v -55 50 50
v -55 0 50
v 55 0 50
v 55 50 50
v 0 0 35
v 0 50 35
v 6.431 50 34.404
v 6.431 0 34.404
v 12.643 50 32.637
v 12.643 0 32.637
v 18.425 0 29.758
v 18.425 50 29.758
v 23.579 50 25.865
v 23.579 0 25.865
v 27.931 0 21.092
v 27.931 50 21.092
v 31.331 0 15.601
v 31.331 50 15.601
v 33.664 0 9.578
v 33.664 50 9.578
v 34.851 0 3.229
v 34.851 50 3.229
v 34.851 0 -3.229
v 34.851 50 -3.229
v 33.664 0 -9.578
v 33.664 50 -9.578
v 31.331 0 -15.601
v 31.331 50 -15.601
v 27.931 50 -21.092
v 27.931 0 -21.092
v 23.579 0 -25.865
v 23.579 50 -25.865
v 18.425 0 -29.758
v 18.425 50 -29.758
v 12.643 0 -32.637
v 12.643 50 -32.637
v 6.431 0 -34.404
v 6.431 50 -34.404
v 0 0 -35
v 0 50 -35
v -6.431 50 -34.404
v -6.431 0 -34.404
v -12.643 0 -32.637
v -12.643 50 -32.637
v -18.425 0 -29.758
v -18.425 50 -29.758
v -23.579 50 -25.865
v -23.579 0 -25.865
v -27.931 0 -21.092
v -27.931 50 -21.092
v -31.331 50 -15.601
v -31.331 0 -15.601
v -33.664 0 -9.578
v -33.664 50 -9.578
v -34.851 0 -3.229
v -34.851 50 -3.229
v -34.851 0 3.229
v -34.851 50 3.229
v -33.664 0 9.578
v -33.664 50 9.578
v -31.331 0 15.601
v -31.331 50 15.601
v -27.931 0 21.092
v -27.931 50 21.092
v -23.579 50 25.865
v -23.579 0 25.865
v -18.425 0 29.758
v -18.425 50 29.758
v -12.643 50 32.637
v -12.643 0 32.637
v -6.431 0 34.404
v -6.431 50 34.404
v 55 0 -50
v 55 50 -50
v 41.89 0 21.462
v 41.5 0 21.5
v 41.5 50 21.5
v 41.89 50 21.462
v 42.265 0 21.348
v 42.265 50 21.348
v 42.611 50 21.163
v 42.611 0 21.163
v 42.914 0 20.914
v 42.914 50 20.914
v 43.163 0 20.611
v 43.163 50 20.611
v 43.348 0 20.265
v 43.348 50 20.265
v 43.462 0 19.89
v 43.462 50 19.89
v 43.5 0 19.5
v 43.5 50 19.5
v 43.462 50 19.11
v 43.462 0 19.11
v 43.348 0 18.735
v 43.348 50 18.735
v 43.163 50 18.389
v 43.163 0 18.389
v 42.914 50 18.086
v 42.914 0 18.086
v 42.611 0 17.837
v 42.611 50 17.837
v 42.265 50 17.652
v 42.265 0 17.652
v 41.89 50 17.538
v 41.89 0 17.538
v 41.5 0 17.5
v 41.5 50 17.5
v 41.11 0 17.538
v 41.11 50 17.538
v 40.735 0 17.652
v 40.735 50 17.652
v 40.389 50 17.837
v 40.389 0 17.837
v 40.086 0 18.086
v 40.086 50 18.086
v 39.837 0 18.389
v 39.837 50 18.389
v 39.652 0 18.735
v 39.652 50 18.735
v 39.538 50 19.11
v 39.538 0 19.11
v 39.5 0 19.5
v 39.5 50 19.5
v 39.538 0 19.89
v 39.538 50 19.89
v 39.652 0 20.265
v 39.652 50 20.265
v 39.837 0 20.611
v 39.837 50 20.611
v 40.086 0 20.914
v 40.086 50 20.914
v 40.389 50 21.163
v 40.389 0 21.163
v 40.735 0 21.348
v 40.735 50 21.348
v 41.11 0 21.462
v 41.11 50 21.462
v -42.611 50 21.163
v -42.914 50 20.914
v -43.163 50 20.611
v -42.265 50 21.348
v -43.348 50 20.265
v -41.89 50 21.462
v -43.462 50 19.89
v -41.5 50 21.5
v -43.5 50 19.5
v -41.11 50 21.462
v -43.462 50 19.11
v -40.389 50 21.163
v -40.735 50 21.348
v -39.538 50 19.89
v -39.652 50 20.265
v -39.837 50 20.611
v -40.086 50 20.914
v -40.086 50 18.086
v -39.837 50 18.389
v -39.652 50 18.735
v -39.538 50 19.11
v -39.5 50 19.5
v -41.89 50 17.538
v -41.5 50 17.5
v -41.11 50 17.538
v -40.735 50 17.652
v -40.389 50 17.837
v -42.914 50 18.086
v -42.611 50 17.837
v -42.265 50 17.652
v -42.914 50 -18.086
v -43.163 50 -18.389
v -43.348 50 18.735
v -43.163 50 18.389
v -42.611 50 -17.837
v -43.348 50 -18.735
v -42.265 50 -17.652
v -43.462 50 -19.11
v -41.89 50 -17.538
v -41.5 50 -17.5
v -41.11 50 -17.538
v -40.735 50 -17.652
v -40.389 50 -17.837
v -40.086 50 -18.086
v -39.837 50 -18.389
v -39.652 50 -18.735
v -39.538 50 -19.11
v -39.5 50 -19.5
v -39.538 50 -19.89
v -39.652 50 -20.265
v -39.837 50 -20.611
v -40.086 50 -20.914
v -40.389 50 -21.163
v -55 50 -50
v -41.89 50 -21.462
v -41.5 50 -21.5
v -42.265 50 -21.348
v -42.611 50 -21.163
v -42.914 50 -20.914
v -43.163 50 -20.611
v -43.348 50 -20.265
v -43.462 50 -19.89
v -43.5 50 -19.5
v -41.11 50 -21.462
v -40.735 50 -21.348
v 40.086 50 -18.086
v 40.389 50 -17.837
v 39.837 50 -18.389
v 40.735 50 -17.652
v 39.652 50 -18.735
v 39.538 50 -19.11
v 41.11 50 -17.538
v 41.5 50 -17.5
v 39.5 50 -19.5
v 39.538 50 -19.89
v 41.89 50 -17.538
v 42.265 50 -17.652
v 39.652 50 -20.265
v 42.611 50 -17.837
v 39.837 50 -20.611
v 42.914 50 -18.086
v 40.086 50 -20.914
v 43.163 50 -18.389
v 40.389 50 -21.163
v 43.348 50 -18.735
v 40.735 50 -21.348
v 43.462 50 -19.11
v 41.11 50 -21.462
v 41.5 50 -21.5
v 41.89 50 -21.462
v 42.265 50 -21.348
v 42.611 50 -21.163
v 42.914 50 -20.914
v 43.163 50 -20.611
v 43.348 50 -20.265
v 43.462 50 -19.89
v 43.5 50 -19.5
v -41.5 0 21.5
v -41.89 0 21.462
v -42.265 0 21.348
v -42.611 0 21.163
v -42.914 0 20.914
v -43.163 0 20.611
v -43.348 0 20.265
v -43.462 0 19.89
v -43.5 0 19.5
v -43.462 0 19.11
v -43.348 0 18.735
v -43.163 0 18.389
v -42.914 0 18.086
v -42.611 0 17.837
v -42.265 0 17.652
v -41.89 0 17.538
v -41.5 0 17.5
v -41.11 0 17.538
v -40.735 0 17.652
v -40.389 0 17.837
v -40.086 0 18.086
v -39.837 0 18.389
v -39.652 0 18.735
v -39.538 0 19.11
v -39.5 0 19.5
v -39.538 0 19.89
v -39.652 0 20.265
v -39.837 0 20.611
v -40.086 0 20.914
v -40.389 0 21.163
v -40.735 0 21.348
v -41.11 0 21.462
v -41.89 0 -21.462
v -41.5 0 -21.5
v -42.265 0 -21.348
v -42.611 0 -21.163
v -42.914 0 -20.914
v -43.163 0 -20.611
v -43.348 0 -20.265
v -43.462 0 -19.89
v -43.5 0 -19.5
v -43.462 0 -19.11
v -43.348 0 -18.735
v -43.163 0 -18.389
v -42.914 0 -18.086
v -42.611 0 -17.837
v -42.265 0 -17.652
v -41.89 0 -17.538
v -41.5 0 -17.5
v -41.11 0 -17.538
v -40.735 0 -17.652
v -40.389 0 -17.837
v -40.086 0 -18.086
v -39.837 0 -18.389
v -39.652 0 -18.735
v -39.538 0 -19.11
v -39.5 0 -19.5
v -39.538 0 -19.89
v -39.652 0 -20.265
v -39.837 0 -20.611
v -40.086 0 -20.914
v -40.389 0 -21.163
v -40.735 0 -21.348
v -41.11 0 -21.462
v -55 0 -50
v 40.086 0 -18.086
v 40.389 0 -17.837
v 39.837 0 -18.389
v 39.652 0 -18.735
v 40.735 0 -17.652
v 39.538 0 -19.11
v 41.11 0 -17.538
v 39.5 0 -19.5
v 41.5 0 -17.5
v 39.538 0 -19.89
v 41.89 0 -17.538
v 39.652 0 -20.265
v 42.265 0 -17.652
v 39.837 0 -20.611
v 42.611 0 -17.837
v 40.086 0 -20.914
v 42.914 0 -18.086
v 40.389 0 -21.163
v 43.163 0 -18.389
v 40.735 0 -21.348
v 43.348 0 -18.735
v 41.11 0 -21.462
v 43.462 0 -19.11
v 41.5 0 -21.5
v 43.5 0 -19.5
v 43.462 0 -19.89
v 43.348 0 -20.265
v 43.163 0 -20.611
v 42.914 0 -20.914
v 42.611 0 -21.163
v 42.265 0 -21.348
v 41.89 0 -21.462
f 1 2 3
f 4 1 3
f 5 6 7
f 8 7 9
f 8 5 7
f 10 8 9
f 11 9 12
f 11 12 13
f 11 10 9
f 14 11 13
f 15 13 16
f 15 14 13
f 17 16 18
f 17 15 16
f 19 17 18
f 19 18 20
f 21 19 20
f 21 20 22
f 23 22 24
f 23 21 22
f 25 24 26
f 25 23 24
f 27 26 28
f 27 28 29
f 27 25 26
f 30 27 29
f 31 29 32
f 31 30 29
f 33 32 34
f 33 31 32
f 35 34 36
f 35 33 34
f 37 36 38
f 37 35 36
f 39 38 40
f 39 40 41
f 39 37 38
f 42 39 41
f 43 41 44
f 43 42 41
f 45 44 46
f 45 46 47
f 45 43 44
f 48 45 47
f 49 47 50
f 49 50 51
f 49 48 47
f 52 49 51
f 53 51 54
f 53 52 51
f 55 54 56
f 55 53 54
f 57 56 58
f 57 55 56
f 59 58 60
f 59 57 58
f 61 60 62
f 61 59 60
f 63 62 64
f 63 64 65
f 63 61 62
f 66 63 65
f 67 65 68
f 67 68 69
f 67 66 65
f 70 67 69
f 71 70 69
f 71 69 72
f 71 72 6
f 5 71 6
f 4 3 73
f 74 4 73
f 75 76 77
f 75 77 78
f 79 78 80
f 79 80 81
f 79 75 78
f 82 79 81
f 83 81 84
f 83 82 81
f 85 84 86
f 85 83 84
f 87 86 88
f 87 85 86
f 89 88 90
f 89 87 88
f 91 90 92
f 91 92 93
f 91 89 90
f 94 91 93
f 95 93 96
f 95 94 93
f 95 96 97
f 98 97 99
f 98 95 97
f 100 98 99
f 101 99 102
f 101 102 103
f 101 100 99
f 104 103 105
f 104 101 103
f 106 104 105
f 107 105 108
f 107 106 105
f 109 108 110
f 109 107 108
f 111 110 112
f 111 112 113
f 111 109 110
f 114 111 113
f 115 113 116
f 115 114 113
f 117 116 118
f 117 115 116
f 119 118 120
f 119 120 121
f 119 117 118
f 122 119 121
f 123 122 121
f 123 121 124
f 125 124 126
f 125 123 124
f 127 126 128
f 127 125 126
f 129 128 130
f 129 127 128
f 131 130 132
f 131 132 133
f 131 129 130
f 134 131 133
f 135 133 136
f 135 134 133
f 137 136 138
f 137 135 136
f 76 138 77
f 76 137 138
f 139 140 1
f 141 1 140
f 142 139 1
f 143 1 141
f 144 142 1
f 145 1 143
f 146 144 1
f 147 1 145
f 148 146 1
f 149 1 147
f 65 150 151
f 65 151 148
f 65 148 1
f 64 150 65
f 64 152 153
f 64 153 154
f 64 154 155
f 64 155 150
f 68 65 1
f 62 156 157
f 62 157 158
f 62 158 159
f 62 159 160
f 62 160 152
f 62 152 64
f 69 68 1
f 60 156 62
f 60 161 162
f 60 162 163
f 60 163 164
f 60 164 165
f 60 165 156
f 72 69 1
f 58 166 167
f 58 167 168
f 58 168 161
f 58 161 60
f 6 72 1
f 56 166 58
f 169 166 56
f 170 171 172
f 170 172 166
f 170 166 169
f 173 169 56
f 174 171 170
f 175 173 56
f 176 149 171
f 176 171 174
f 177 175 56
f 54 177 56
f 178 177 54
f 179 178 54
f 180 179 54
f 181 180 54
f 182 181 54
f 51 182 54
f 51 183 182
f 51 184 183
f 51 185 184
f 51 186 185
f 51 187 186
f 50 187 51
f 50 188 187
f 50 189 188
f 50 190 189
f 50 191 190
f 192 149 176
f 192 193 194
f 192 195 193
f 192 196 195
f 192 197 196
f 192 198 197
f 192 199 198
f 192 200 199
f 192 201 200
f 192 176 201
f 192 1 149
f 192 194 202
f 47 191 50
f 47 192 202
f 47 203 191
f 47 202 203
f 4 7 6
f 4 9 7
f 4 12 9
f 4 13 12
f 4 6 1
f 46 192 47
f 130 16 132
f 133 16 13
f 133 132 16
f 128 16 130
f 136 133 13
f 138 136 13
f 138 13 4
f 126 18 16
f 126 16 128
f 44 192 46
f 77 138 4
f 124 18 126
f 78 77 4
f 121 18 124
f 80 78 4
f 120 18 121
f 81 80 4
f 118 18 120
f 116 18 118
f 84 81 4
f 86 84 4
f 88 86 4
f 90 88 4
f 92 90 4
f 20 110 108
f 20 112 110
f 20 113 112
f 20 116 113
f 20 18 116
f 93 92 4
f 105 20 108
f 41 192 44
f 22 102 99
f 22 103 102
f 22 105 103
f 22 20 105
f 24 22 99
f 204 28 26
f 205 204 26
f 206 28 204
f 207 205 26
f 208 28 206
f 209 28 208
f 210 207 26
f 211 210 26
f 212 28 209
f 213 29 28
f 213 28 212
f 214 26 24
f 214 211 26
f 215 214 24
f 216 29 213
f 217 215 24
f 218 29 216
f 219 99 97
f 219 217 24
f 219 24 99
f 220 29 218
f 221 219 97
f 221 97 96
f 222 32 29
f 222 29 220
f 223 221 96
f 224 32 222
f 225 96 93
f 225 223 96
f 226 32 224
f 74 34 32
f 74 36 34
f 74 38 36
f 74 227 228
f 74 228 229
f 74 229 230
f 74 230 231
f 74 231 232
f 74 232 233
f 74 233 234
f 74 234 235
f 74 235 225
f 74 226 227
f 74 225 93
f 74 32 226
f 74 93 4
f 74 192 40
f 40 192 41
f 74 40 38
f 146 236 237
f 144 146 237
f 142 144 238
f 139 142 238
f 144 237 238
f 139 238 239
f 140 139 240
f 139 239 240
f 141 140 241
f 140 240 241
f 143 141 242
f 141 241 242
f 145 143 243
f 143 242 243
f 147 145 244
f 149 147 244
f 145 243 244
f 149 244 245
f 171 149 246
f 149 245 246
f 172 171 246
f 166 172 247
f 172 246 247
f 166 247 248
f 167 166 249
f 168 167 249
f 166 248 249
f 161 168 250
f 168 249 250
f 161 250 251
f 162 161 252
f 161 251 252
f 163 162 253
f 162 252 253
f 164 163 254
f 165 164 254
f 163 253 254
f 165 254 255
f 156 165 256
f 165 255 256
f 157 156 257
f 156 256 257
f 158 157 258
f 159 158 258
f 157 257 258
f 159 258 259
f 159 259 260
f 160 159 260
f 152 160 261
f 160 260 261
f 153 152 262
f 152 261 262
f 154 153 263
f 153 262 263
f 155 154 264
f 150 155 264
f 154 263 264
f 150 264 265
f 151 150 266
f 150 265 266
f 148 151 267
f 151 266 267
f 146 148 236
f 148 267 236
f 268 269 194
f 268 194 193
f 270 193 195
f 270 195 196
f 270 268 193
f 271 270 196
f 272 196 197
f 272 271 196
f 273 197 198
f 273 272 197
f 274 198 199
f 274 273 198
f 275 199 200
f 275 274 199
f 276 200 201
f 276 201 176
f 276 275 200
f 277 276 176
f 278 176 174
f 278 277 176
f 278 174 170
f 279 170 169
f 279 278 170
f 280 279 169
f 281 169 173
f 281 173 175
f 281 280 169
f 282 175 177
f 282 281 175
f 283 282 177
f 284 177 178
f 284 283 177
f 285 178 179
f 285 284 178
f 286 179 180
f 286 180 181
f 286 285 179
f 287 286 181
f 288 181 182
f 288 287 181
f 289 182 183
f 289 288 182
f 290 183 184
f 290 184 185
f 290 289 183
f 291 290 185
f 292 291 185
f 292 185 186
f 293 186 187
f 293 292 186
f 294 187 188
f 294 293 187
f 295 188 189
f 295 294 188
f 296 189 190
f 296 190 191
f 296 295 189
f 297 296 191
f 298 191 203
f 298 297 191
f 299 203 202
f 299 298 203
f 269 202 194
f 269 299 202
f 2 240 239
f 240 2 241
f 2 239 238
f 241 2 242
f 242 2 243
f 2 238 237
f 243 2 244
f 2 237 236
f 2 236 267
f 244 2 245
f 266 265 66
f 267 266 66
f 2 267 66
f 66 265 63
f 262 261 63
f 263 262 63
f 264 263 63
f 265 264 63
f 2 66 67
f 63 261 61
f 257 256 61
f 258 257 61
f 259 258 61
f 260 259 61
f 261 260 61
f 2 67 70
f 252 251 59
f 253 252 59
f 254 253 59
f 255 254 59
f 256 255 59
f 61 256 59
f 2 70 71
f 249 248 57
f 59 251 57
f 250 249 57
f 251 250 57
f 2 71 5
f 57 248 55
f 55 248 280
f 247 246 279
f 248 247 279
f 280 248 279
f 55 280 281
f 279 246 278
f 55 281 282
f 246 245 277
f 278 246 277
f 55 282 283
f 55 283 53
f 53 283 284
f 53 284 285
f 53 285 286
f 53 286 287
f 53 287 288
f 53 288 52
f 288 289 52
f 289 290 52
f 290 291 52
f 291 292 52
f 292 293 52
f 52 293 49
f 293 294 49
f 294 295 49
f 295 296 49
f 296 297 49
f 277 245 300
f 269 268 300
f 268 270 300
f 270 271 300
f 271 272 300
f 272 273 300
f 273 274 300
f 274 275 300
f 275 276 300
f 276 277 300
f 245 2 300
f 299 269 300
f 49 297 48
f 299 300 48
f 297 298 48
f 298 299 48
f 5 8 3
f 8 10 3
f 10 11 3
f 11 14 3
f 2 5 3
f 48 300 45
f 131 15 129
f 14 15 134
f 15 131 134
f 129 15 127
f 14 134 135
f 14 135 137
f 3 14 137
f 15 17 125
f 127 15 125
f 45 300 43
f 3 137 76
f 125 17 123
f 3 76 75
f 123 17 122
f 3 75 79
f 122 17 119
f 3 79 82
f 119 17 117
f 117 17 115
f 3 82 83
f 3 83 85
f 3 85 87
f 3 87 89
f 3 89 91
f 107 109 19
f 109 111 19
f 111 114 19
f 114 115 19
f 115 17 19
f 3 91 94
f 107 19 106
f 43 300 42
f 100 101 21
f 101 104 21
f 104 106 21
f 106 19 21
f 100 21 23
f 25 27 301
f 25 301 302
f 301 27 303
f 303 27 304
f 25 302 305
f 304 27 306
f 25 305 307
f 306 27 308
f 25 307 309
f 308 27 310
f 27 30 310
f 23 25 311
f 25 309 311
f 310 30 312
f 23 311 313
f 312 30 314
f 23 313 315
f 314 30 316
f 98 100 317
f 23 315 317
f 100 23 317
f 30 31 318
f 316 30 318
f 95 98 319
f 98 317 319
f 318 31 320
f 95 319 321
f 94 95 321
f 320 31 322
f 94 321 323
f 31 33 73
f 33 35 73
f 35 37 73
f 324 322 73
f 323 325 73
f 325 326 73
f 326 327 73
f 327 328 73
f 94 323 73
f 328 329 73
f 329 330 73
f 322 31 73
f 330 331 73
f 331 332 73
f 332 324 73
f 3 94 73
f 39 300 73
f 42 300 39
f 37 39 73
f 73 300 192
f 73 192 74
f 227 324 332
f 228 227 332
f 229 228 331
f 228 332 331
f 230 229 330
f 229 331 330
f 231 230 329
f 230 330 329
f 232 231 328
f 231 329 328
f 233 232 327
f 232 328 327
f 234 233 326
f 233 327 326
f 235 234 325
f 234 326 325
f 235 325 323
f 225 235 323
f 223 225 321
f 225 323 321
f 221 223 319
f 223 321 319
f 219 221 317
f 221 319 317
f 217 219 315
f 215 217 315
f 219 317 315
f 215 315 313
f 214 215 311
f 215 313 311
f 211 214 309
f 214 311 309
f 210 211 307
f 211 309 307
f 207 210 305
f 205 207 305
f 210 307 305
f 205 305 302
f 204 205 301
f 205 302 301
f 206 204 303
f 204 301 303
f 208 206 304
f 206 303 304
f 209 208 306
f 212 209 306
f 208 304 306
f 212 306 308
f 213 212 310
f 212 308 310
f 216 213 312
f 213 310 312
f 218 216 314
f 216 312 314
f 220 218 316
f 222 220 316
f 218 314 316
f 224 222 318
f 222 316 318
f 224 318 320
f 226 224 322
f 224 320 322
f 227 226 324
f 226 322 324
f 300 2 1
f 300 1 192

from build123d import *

# Parameters (mm, degrees)
SKETCH1_W               = 110
SKETCH1_H               = 100
BOSS_EXTRUDE1_DEPTH     = 50
SKETCH2_R               = 35
CUT_EXTRUDE1_DEPTH      = 50
SKETCH3_R               = 2
CUT_EXTRUDE2_DEPTH      = 50
MIRROR3_COPY_1_SKETCH_R = 2
MIRROR3_COPY_1_DEPTH    = 50
MIRROR3_COPY_2_SKETCH_R = 2
MIRROR3_COPY_2_DEPTH    = 50


with BuildPart() as part:
    # Sketch1 → Boss-Extrude1 (new body)
    with BuildSketch(Plane(origin=(0, 0, 0), x_dir=(1, 0, 0), z_dir=(0, 1, 0))):
        Rectangle(SKETCH1_W, SKETCH1_H)
    extrude(amount=BOSS_EXTRUDE1_DEPTH)

    # Sketch2 → Cut-Extrude1 (cut)
    with BuildSketch(Plane(origin=(0, 0, 0), x_dir=(1, 0, 0), z_dir=(0, 1, 0))):
        with Locations(Location((0, 0, 0), (0, 0, 270))):
            Circle(SKETCH2_R)
    extrude(amount=CUT_EXTRUDE1_DEPTH, mode=Mode.SUBTRACT)

    # Sketch3 → Cut-Extrude2 (cut)
    with BuildSketch(Plane(origin=(0, 0, 0), x_dir=(1, 0, 0), z_dir=(0, 1, 0))):
        with Locations(Location((41.5, -19.5, 0), (0, 0, 270))):
            Circle(SKETCH3_R)
    cut_extrude2 = extrude(amount=CUT_EXTRUDE2_DEPTH, mode=Mode.SUBTRACT)

    # Mirror1: Cut-Extrude2 across plane
    add(cut_extrude2.mirror(Plane.XY), mode=Mode.SUBTRACT)

    # Mirror2: Cut-Extrude2 across plane
    add(cut_extrude2.mirror(Plane(origin=(0, 0, 0), x_dir=(0, 0, 1), z_dir=(1, 0, 0))), mode=Mode.SUBTRACT)

    # Mirror3 copy 1 sketch → Mirror3 copy 1 (cut)
    with BuildSketch(Plane(origin=(0, 0, 0), x_dir=(-1, 0, 0), z_dir=(0, 1, 0))):
        with Locations(Location((41.5, -19.5, 0), (0, 0, 270))):
            Circle(MIRROR3_COPY_1_SKETCH_R)
    extrude(amount=MIRROR3_COPY_1_DEPTH, mode=Mode.SUBTRACT)

    # Mirror3 copy 2 sketch → Mirror3 copy 2 (cut)
    with BuildSketch(Plane(origin=(0, 0, 0), x_dir=(1, 0, 0), z_dir=(0, 1, 0))):
        with Locations((41.5, 19.5)):
            Circle(MIRROR3_COPY_2_SKETCH_R)
    extrude(amount=MIRROR3_COPY_2_DEPTH, mode=Mode.SUBTRACT)


solid = part.part
